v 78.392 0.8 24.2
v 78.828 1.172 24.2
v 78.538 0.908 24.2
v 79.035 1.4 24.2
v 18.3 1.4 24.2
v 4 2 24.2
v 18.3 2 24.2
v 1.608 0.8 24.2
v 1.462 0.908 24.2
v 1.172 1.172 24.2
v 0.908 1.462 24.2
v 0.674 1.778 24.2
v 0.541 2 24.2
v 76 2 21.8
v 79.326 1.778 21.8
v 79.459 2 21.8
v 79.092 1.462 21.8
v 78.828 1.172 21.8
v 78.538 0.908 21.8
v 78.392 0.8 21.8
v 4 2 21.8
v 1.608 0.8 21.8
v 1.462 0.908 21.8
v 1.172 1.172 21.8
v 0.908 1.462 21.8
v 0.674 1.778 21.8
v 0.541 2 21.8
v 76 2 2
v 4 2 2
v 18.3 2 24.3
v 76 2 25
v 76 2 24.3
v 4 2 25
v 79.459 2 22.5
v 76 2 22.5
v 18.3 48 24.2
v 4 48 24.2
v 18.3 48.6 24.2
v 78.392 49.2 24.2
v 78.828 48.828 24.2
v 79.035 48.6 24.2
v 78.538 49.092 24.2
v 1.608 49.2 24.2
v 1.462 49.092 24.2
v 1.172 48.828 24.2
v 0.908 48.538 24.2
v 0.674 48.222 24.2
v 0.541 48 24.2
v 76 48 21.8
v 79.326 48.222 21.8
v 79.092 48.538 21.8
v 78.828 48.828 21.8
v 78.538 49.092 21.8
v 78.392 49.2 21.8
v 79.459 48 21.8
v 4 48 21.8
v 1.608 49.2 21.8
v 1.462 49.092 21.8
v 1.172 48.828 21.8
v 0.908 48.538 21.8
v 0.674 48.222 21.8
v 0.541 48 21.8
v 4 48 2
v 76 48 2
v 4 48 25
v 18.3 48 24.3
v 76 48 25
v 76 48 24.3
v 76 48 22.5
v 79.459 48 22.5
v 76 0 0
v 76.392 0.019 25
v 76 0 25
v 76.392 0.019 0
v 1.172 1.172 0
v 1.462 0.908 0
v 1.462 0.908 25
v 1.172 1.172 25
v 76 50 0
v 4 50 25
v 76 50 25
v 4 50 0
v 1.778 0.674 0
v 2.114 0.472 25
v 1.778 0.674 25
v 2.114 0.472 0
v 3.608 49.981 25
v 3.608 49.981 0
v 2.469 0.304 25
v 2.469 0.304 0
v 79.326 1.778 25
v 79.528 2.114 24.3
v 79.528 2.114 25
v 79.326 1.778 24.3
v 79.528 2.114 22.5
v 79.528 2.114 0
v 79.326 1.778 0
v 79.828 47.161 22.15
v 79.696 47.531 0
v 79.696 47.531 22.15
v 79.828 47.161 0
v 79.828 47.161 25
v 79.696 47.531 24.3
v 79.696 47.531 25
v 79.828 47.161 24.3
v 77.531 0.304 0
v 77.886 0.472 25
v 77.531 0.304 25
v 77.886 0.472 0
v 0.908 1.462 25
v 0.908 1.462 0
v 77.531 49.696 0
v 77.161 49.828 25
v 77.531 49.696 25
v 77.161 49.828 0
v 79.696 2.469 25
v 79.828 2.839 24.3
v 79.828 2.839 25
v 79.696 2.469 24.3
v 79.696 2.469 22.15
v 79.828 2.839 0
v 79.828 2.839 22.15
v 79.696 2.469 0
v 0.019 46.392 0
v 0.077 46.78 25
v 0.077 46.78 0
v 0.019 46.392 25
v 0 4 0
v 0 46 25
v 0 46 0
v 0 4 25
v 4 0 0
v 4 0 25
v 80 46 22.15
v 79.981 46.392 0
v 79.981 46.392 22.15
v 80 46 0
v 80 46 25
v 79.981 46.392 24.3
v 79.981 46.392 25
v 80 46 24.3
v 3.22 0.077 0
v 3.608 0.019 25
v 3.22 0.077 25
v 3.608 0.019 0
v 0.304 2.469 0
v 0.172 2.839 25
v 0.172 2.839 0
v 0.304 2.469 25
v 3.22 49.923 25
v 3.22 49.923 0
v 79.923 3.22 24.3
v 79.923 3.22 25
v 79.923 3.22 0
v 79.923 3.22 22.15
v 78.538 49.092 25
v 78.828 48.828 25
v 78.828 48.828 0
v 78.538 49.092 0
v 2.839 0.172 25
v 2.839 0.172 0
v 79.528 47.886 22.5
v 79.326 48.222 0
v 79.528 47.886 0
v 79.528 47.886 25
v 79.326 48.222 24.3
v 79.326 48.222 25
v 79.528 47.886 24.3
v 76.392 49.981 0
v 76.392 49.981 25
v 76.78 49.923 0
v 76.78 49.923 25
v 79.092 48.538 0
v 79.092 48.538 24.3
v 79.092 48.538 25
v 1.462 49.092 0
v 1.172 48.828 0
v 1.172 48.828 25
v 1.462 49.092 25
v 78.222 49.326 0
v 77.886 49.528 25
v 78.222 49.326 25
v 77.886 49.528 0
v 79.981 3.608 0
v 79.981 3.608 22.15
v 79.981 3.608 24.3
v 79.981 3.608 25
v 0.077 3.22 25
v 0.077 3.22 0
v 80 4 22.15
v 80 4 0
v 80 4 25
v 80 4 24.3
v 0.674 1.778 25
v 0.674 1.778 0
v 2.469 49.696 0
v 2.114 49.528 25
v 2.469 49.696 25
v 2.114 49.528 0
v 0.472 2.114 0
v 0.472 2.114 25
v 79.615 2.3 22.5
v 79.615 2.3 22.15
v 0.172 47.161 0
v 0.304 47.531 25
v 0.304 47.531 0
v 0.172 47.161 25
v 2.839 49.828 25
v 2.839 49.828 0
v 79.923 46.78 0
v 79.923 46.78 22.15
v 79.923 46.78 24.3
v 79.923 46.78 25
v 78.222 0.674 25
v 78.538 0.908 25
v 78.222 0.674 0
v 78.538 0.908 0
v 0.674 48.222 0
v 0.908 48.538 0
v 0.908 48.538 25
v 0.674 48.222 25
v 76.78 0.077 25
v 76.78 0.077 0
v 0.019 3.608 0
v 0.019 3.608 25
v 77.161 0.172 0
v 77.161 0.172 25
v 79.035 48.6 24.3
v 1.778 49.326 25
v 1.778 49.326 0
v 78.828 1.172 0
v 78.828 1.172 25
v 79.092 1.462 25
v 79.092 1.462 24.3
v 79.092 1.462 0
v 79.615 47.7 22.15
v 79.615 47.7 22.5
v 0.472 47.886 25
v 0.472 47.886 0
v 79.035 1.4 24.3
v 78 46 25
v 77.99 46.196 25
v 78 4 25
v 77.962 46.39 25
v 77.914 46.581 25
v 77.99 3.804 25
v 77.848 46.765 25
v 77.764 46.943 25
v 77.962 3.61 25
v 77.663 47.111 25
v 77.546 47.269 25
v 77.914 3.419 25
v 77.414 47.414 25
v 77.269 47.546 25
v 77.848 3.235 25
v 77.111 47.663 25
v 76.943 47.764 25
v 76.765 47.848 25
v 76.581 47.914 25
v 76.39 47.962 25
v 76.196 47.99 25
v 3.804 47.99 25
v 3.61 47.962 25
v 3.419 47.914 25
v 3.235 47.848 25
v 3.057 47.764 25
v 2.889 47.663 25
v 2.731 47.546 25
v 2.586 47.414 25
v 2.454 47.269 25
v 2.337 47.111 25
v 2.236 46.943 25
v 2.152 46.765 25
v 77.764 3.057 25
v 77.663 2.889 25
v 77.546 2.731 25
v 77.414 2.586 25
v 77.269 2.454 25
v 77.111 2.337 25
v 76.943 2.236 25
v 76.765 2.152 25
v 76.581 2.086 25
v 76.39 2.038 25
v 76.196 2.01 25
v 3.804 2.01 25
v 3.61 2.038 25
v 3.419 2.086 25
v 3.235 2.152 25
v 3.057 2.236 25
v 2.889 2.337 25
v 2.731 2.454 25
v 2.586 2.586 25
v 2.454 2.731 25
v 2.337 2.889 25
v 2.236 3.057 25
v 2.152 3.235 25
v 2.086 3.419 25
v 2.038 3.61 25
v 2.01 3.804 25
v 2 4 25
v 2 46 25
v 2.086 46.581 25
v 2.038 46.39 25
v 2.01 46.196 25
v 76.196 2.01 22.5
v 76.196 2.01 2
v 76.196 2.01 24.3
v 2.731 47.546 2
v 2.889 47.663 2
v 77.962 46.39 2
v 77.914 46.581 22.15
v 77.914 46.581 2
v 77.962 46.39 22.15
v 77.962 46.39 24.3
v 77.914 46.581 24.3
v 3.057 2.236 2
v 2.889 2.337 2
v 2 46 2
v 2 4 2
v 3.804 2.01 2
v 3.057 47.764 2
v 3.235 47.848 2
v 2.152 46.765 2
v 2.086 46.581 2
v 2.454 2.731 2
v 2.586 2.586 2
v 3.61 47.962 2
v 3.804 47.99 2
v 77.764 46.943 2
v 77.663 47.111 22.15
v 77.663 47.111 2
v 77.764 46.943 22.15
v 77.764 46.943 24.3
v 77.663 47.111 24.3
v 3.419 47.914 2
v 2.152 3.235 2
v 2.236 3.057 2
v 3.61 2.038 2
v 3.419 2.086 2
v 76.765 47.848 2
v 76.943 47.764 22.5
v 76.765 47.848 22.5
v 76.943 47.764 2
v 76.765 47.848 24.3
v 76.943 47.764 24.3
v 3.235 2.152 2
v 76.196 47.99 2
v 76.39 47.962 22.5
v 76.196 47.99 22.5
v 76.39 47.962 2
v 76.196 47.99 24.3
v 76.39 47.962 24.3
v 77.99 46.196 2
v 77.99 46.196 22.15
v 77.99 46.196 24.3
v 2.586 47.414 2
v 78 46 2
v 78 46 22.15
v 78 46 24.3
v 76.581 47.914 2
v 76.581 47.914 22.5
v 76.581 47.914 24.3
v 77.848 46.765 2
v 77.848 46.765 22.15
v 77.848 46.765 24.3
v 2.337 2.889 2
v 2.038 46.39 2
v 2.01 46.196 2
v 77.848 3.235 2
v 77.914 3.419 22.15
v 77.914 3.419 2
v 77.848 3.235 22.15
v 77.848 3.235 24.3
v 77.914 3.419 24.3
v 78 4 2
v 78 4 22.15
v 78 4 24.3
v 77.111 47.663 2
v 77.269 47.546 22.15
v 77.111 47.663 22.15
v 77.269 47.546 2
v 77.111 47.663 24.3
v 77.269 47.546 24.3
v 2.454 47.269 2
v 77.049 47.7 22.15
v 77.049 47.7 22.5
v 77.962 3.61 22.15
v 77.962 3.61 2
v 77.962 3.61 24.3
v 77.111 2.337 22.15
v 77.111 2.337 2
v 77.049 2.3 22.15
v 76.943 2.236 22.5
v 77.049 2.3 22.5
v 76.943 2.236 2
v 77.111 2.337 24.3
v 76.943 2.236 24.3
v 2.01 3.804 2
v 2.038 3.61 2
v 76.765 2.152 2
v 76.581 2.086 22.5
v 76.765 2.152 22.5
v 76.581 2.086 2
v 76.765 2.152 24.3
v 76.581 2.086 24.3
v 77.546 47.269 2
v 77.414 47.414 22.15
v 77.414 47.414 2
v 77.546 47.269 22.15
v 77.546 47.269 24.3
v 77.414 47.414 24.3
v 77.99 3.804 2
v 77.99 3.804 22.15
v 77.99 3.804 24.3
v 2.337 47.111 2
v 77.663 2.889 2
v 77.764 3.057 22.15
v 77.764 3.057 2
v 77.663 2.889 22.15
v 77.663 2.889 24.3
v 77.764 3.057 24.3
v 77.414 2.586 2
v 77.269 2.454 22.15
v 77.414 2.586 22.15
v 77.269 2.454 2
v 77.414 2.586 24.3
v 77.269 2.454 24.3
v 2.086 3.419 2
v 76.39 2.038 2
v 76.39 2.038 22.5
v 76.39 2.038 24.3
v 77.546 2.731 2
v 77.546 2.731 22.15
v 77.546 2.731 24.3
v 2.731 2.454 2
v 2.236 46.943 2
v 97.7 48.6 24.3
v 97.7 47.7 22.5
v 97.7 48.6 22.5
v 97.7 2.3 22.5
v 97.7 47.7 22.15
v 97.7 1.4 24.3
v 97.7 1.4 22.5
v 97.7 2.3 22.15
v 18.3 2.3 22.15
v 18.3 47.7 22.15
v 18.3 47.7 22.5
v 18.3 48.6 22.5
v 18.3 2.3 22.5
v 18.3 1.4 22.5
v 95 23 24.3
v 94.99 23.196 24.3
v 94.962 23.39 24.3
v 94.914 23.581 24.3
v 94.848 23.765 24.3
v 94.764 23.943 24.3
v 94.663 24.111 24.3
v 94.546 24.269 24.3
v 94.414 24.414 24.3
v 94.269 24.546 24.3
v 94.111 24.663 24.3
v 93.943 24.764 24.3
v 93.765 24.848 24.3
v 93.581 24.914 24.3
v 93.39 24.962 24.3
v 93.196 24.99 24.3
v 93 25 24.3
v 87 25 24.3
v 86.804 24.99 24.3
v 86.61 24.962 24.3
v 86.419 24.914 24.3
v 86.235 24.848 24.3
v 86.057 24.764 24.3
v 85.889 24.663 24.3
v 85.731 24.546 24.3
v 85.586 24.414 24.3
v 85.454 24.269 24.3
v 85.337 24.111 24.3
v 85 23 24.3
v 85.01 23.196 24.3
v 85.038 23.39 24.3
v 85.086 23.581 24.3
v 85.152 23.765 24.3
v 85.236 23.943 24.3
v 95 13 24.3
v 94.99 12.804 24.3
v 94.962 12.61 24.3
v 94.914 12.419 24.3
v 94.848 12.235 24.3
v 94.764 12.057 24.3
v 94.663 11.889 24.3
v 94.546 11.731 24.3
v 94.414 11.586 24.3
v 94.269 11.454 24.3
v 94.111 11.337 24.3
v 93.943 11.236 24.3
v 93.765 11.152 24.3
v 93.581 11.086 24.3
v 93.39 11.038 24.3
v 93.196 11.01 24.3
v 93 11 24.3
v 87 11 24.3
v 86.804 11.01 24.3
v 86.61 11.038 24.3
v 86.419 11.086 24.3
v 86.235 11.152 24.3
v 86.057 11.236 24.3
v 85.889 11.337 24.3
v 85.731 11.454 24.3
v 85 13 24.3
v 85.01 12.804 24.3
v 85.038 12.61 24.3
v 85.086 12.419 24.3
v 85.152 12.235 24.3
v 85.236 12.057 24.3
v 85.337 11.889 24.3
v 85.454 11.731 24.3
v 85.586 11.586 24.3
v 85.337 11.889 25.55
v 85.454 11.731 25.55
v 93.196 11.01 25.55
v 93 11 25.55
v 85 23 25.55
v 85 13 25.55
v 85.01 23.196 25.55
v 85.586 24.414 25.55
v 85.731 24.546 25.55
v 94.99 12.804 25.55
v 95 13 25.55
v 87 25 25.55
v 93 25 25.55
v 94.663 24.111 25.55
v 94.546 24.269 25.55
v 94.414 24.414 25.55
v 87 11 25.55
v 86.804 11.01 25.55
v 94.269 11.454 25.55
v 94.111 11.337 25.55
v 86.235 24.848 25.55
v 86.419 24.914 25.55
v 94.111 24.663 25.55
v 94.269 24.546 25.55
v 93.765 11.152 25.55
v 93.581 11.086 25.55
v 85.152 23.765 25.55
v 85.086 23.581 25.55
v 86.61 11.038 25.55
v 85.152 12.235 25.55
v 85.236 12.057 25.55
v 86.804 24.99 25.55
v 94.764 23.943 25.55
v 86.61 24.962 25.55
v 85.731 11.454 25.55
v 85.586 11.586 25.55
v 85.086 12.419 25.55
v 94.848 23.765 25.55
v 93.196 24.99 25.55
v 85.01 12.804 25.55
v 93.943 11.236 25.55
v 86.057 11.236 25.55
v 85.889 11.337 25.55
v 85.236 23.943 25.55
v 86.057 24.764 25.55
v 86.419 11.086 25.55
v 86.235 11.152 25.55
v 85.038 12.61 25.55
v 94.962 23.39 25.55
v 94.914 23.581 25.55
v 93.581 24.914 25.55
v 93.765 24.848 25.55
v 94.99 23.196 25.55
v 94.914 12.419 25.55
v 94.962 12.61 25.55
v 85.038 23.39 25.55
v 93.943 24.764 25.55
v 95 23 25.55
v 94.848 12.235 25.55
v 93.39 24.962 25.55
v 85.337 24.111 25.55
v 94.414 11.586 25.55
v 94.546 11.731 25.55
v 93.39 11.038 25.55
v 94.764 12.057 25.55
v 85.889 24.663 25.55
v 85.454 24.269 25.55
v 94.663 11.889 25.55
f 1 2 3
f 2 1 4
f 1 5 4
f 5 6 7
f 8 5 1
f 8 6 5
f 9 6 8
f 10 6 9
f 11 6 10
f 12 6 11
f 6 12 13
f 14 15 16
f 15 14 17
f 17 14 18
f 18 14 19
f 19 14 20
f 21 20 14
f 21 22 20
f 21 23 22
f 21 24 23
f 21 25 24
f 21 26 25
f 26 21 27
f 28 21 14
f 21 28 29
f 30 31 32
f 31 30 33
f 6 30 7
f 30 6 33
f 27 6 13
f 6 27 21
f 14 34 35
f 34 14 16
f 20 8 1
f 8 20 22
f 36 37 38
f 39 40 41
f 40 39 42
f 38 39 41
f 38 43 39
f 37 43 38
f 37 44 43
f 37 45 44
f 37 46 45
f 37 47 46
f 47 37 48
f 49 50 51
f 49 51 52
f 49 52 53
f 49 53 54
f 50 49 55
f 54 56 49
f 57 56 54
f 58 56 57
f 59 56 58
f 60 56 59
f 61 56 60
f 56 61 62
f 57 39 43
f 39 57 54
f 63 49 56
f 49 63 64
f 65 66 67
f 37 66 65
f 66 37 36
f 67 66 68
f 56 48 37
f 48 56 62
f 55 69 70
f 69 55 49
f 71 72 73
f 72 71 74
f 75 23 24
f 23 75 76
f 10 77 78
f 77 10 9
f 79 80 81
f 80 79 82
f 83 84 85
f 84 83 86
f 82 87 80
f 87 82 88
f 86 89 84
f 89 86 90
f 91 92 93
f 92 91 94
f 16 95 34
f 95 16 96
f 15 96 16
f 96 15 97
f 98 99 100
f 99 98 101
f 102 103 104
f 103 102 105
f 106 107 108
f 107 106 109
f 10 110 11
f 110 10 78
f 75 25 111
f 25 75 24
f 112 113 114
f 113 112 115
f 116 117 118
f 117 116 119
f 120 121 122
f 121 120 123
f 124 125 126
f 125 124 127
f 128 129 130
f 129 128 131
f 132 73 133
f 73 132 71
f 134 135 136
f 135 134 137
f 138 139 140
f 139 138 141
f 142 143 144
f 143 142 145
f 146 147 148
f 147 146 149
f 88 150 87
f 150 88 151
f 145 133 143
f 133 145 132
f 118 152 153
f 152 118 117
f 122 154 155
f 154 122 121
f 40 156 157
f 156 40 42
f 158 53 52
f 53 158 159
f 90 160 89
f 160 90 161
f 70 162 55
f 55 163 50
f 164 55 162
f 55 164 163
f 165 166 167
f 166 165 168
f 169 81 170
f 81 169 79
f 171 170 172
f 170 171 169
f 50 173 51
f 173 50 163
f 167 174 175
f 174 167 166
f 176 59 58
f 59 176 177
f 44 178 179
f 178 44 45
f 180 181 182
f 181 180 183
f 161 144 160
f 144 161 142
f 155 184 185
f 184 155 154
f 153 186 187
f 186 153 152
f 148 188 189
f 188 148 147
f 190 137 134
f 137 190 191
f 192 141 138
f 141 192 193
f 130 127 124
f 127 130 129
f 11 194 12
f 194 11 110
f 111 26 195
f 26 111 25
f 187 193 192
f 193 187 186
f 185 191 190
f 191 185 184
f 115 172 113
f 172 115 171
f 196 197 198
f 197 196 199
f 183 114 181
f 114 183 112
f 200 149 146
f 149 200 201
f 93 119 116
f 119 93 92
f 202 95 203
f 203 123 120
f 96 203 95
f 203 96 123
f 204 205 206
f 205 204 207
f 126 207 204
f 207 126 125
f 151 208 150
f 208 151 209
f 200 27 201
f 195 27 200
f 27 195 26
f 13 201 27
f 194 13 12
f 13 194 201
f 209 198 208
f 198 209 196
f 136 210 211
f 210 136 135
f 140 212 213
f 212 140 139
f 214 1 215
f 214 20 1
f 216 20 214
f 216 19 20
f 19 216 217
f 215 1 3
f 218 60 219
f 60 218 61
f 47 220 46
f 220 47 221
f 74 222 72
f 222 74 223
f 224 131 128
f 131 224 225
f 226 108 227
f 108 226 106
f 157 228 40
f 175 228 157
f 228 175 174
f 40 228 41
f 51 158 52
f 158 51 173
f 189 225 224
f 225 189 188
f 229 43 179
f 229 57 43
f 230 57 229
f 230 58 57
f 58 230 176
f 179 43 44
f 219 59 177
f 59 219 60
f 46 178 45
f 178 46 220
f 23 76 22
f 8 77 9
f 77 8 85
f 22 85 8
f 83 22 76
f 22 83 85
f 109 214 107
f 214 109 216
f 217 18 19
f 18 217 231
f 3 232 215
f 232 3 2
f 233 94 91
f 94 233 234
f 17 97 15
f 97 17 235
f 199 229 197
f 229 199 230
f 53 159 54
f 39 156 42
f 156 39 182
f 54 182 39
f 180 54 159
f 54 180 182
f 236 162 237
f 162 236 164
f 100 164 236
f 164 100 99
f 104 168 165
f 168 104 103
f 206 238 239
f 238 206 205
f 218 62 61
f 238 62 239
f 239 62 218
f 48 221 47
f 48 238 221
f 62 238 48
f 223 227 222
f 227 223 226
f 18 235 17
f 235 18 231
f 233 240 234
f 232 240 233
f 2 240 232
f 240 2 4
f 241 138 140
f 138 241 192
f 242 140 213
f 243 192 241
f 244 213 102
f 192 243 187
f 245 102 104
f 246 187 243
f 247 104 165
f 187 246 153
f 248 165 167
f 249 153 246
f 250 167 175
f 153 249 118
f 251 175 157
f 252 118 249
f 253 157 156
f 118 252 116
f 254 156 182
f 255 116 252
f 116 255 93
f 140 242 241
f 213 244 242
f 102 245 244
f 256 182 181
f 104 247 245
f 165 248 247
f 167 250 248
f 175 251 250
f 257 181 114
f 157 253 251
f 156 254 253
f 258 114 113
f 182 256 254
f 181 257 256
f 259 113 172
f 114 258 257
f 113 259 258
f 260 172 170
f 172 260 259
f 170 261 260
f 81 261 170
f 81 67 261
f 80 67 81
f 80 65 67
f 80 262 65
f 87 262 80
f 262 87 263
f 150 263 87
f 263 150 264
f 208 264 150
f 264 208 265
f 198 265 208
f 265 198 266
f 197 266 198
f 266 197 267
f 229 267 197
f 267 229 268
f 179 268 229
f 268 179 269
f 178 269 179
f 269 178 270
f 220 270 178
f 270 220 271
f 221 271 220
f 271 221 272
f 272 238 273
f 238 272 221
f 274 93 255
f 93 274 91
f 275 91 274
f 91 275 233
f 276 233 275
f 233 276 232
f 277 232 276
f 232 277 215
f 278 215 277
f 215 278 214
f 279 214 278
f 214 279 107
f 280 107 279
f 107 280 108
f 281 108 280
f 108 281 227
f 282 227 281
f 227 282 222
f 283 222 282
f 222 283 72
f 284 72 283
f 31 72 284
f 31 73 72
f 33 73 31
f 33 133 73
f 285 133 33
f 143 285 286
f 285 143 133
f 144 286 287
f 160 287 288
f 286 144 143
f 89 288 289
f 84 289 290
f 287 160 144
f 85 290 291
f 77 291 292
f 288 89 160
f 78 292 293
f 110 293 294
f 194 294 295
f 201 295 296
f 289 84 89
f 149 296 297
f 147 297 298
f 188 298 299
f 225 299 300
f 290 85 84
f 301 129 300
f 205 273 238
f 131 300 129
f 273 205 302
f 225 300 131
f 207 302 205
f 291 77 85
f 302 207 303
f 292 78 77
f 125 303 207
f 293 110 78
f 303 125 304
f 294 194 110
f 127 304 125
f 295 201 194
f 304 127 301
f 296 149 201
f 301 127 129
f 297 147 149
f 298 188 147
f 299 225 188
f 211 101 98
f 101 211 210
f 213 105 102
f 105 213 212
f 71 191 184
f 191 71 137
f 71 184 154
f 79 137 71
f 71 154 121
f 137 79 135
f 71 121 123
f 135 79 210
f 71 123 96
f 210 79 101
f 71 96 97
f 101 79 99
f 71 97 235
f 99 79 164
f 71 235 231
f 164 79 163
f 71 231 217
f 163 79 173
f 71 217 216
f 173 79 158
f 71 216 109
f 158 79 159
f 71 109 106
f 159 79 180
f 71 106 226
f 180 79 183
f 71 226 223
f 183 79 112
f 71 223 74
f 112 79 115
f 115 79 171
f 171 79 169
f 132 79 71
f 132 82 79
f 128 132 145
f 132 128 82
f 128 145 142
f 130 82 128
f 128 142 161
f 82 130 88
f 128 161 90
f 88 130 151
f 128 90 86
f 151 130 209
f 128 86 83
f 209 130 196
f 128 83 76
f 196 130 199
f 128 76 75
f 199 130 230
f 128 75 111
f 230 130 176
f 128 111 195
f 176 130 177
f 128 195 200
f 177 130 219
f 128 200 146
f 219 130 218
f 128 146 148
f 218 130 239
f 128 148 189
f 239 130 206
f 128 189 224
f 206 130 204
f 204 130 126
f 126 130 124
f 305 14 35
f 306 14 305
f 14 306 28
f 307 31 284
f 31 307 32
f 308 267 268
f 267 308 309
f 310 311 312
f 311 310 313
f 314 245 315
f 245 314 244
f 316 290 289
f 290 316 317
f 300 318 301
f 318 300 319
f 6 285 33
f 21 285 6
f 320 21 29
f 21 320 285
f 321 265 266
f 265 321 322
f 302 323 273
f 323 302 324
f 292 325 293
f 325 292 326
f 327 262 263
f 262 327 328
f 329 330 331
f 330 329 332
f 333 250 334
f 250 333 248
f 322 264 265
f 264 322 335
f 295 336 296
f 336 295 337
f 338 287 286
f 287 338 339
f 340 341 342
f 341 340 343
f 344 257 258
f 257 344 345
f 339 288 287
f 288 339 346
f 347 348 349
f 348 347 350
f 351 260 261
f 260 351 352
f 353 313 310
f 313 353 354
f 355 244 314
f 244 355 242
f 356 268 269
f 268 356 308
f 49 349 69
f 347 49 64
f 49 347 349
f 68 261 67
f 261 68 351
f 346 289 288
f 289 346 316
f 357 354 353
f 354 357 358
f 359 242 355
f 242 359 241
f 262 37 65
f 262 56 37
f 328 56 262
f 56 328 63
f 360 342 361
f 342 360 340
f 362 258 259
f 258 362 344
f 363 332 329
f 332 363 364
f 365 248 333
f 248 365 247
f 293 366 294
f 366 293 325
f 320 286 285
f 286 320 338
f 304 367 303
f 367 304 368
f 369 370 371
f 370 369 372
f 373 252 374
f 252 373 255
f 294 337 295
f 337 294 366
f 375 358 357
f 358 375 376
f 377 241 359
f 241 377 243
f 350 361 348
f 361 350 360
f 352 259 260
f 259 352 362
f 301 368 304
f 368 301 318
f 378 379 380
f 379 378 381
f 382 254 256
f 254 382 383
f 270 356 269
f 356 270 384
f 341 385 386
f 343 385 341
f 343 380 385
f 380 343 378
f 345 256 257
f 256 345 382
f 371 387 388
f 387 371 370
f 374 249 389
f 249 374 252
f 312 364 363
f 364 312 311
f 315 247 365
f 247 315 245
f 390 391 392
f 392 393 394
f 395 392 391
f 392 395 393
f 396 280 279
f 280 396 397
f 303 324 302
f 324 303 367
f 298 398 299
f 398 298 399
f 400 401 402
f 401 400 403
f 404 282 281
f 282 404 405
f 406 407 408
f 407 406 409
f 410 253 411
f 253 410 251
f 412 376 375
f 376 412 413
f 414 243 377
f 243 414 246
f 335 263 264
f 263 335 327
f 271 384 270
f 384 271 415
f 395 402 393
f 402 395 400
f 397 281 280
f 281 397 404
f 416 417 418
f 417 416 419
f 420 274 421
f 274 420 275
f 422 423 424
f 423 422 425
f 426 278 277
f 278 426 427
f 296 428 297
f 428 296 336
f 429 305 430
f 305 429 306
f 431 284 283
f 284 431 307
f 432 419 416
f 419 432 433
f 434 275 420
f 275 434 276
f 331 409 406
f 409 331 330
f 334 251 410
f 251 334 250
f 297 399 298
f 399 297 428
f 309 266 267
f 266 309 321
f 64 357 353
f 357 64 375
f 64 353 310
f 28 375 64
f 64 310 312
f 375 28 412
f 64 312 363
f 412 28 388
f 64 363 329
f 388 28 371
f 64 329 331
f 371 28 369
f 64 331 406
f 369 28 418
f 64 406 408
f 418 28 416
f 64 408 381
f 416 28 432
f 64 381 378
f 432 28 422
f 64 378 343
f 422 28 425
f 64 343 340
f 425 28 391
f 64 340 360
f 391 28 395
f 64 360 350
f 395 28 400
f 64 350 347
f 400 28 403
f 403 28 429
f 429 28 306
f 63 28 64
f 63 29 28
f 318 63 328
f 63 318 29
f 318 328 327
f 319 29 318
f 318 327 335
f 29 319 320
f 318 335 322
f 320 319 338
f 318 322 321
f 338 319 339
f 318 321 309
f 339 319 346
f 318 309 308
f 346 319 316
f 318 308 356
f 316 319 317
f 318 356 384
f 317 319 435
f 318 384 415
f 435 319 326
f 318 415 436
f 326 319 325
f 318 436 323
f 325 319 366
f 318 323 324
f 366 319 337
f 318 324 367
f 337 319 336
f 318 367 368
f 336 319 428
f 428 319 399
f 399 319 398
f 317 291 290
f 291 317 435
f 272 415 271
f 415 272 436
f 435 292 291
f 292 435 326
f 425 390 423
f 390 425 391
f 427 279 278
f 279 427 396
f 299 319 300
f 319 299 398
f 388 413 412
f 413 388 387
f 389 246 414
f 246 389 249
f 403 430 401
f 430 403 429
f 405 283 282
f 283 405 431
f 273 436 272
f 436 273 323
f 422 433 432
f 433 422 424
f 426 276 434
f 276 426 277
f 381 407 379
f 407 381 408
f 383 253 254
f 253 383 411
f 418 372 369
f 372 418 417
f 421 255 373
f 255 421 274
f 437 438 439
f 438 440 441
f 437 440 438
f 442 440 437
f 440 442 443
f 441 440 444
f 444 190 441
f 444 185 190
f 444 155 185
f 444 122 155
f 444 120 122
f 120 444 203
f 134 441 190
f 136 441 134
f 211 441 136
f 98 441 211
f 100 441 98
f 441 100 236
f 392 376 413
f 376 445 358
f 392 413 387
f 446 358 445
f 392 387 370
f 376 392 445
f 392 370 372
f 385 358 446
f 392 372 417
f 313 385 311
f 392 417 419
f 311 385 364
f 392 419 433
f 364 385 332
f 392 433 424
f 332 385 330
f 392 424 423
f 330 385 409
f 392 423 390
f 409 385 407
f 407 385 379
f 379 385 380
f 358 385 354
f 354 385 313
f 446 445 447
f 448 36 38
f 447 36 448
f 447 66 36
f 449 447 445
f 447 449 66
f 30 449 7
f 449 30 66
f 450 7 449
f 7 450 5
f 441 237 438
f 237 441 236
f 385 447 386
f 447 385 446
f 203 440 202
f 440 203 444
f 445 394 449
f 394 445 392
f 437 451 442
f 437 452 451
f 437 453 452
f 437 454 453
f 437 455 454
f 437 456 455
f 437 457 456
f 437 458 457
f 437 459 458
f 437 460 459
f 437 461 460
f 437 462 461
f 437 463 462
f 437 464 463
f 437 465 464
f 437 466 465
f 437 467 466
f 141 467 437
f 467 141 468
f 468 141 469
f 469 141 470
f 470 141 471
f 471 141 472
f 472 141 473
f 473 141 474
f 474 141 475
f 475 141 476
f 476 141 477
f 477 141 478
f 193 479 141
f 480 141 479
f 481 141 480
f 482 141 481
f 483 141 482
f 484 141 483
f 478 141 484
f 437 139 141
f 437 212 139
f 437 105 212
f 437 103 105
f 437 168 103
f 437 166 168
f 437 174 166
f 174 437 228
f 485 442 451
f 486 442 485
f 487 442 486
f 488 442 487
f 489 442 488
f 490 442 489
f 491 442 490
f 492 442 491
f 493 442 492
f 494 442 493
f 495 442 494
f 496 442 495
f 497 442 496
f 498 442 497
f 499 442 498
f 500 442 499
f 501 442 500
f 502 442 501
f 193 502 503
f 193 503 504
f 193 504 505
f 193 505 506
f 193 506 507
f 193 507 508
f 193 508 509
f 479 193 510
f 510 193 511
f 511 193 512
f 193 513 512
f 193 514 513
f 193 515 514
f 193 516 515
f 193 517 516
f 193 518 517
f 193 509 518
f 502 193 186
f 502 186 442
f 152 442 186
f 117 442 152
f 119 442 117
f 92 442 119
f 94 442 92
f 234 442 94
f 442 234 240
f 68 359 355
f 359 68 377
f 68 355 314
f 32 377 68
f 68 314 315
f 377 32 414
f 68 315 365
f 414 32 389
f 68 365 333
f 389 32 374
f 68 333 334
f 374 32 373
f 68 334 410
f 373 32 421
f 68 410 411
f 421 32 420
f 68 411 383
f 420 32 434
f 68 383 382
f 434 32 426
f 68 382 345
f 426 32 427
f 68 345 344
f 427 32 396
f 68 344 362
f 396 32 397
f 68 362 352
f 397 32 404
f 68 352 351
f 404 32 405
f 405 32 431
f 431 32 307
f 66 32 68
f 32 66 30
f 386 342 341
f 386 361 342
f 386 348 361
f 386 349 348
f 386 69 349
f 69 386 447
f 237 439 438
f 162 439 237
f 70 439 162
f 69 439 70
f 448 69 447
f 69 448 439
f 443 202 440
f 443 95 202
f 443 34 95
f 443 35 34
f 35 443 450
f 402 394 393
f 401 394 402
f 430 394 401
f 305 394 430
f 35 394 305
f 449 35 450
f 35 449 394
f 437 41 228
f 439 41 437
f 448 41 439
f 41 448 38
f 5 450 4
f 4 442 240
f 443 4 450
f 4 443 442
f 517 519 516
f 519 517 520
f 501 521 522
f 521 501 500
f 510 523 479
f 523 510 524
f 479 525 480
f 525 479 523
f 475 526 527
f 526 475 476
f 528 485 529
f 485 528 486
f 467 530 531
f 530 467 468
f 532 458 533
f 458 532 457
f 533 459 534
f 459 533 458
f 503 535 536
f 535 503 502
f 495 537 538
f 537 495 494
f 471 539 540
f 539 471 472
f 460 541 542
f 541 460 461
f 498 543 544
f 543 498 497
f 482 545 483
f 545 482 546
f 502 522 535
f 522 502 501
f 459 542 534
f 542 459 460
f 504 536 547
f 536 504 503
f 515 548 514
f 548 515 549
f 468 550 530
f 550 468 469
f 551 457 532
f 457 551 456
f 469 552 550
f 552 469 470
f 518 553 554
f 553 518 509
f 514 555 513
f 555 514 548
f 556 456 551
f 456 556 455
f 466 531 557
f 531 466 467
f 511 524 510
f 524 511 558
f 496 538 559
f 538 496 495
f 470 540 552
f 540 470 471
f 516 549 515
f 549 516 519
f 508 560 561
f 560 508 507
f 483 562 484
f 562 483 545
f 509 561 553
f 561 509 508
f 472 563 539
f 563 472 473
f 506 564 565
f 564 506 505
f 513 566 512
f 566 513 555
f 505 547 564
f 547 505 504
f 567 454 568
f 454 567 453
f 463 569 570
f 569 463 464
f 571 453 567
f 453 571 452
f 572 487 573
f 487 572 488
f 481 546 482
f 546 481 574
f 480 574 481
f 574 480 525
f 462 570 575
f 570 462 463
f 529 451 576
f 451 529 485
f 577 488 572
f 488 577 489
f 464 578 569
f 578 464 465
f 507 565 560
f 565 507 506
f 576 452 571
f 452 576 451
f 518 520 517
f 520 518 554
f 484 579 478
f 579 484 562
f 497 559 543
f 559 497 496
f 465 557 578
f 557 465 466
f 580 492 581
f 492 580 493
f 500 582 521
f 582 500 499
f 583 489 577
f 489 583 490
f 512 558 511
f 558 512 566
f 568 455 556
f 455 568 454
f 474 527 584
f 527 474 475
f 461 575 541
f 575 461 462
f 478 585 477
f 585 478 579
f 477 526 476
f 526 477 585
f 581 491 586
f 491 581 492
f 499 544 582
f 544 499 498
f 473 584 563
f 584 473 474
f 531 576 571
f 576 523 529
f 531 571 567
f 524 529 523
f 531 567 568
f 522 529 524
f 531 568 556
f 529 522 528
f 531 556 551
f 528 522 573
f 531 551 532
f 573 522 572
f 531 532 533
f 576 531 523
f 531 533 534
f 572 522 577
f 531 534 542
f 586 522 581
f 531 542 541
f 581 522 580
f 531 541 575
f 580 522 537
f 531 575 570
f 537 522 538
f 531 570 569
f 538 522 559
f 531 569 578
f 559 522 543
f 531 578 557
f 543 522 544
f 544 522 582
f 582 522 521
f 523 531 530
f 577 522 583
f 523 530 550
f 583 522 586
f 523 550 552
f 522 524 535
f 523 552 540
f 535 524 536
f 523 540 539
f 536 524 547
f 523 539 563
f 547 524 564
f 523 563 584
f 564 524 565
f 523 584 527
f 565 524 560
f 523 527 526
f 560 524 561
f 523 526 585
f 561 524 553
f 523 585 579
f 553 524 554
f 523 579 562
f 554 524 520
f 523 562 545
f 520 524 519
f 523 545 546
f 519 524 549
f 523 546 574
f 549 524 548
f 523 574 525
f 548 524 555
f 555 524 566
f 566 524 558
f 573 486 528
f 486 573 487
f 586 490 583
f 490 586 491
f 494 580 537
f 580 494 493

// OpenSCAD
// 80 x 50 x 25 mm sliding-lid box
// Units: mm. view_mode: 0=assembly, 1=body, 2=lid, 3=print layout.
view_mode = 0;

outer_x = 80;
outer_y = 50;
outer_z = 25;
wall = 2;
corner_r = 4;
clearance = 0.30;
lid_t = 2;
groove_h = 2.4;
groove_depth = 1.2;

$fn = 64;

module rounded_rect_2d(x, y, r) {
  offset(r = r) square([x - 2*r, y - 2*r], center = true);
}

module rounded_prism(x, y, z, r) {
  linear_extrude(height = z) rounded_rect_2d(x, y, r);
}

module body() {
  difference() {
    translate([outer_x/2, outer_y/2, 0])
      rounded_prism(outer_x, outer_y, outer_z, corner_r);

    // Main cavity, open through the top.
    translate([outer_x/2, outer_y/2, wall])
      rounded_prism(
        outer_x - 2*wall,
        outer_y - 2*wall,
        outer_z,
        max(corner_r - wall, 0.5)
      );

    // Matching side grooves; open at the front so the lid slides in along X.
    for (y = [wall - groove_depth/2, outer_y - wall + groove_depth/2])
      translate([-0.1, y - groove_depth/2, outer_z - groove_h - 0.8])
        cube([outer_x + 0.2, groove_depth, groove_h]);
  }
}

module lid() {
  lid_y = outer_y - 2*wall - 2*clearance;
  tongue_y = lid_y + 2*(groove_depth - clearance);

  union() {
    // Top panel.
    translate([clearance, 0, 0])
      cube([outer_x - 2*clearance, lid_y, lid_t]);

    // Thin tongues engage the grooves in both long side walls.
    translate([clearance, -(tongue_y - lid_y)/2, 0.35])
      cube([outer_x - 2*clearance, tongue_y, groove_h - 2*clearance]);

    // Small pull tab at the exposed end.
    translate([outer_x - 8, lid_y/2 - 7, lid_t])
      linear_extrude(height = 1.4)
        offset(r = 2) square([6, 10], center = true);
  }
}

if (view_mode == 1) {
  body();
} else if (view_mode == 2) {
  lid();
} else if (view_mode == 3) {
  body();
  translate([0, outer_y + 8, 0]) lid();
} else {
  color("DeepSkyBlue") body();
  // Partially open assembly view for visual inspection.
  color([1.0, 0.55, 0.12, 0.92])
    translate([18, wall + clearance, outer_z - groove_h - 0.45]) lid();
}
